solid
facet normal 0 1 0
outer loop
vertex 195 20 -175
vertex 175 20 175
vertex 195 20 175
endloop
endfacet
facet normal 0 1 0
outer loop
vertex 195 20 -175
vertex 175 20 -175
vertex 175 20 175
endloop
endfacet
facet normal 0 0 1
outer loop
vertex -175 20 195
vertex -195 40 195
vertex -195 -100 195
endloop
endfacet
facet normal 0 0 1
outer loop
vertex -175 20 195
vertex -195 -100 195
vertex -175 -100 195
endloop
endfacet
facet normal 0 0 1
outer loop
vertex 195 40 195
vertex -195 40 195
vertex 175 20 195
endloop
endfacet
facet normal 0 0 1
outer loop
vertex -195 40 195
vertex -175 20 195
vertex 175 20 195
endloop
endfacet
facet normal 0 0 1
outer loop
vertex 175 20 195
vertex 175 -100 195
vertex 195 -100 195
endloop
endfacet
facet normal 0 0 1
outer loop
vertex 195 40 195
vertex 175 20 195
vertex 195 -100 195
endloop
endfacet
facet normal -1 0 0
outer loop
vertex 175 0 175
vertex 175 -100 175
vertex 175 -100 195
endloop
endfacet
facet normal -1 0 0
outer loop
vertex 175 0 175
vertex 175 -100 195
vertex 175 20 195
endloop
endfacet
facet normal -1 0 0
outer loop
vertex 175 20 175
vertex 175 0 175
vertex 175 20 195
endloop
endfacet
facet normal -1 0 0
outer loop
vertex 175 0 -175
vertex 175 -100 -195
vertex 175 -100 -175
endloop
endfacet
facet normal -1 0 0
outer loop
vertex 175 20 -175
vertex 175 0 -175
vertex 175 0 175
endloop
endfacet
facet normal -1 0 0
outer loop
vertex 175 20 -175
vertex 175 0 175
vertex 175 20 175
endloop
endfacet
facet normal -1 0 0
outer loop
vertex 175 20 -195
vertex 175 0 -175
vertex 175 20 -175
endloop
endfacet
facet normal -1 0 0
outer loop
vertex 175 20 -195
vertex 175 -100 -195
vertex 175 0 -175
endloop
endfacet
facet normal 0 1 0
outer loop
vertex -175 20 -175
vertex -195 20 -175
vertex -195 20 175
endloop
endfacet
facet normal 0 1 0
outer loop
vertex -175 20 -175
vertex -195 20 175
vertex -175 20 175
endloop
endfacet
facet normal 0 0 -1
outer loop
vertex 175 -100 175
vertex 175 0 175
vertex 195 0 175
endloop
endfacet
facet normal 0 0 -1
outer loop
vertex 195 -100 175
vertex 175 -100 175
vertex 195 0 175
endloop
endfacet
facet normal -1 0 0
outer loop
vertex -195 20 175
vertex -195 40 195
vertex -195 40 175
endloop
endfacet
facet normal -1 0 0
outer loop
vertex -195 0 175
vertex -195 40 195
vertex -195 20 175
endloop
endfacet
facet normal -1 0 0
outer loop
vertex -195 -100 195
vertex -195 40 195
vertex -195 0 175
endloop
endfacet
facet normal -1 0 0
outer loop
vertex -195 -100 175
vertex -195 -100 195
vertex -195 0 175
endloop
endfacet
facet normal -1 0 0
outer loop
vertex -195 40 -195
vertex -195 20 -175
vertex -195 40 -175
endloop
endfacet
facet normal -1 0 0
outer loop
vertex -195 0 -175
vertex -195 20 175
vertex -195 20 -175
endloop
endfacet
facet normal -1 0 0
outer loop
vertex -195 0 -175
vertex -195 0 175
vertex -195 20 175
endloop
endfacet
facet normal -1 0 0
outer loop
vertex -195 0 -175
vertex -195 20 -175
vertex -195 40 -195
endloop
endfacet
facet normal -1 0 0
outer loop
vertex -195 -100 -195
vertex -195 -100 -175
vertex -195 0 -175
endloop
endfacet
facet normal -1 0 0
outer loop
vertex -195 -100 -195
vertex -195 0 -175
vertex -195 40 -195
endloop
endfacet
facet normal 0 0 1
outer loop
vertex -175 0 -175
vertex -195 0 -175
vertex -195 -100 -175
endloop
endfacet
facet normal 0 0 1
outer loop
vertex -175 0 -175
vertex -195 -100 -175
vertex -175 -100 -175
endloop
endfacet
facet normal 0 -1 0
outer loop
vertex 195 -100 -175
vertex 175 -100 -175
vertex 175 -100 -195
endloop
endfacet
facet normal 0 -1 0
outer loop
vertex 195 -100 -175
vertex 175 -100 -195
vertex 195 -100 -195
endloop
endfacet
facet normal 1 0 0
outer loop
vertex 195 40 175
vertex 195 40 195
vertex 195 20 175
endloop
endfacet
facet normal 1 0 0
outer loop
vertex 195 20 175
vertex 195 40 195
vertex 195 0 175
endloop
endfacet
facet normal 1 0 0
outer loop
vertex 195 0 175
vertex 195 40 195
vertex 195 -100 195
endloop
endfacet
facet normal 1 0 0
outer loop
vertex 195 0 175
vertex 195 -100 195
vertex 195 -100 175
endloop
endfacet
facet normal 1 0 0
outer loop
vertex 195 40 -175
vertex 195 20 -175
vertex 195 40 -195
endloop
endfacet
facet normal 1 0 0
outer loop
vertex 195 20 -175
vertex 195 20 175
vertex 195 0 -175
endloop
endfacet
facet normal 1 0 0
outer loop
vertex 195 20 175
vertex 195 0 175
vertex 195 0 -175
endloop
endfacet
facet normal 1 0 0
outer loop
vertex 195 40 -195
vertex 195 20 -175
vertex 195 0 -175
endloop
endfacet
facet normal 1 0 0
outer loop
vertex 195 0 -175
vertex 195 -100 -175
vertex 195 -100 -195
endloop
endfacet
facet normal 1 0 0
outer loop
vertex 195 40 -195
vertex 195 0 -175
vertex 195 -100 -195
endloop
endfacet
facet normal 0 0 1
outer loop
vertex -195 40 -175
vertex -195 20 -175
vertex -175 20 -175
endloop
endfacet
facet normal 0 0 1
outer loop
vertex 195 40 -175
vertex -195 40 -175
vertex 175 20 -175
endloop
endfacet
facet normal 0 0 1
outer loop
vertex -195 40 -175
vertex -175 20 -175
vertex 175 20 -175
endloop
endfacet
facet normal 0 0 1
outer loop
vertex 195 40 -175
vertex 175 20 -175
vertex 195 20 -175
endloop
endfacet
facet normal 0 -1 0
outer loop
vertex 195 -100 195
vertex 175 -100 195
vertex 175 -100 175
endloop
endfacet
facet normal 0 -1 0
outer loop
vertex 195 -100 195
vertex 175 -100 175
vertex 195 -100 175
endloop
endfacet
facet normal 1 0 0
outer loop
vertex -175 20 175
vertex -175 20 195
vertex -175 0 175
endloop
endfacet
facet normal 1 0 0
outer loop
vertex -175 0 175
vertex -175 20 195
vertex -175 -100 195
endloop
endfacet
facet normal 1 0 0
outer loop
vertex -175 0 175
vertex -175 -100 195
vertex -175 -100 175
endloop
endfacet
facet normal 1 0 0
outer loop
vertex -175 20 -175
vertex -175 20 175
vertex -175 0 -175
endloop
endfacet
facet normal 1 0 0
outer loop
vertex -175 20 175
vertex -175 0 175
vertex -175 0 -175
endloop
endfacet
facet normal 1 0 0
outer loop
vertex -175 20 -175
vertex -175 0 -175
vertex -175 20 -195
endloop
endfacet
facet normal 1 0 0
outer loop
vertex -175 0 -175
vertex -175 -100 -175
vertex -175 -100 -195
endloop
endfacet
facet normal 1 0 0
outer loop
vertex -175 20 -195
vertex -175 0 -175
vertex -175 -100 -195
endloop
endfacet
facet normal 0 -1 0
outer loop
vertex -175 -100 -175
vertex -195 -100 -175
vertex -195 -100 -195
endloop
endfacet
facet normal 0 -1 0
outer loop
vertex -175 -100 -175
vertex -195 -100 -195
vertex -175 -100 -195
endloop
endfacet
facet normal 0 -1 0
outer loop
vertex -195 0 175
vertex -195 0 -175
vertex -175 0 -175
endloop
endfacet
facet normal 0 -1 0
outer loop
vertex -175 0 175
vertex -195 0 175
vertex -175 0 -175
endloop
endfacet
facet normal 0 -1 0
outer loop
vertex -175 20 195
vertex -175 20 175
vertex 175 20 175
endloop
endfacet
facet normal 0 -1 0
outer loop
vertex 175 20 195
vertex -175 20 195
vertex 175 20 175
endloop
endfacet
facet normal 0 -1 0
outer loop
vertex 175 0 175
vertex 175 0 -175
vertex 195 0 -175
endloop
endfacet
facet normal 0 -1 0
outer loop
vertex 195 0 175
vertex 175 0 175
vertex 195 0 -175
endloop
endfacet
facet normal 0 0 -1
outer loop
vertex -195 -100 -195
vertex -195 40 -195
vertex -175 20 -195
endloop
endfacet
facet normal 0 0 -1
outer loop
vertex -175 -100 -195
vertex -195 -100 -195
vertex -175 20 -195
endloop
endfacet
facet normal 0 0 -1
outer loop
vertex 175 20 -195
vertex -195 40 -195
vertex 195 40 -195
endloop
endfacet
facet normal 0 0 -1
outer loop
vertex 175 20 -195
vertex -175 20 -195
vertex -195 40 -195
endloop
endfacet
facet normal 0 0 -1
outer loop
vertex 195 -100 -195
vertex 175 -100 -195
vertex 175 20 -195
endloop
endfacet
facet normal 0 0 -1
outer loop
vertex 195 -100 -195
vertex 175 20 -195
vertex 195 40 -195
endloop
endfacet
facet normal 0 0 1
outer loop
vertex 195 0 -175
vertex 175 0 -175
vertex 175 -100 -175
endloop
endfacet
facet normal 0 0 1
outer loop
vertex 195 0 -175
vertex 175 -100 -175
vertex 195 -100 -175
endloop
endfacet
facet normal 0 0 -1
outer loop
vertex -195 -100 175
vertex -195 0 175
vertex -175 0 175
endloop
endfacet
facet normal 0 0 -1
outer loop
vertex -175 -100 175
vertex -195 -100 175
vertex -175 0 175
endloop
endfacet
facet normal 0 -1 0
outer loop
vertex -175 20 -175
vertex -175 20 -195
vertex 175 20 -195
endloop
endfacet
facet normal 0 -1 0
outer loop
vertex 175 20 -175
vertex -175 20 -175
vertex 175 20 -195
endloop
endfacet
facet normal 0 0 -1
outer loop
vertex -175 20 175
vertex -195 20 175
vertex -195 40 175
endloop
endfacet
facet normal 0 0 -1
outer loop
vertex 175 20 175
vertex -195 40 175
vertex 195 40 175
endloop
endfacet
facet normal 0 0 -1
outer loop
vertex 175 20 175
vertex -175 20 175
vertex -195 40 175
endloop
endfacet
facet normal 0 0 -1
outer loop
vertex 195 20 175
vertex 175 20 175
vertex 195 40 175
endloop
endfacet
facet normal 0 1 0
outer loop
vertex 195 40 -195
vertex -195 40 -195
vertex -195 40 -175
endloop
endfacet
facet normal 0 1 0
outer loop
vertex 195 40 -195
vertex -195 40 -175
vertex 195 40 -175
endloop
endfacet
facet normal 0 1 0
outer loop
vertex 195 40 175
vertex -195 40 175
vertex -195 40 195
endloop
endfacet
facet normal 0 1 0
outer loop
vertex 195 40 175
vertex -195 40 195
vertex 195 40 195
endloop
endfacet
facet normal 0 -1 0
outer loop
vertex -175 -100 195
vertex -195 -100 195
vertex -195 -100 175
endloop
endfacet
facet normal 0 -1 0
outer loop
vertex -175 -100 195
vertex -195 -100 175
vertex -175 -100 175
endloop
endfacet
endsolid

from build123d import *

# Parameters (mm, degrees)
SKETCH1_W               = 390
SKETCH1_H               = 390
SKETCH1_W_2             = 350
SKETCH1_H_2             = 350
BOSS_EXTRUDE1_DEPTH     = 20
SKETCH2_W               = 20
SKETCH2_H               = 20
BOSS_EXTRUDE2_DEPTH     = 100
SKETCH4_W               = 390
SKETCH4_H               = 20
BOSS_EXTRUDE3_DEPTH     = 20
CUT_EXTRUDE1_DEPTH      = 448.353327919
CUT_EXTRUDE1_DEPTH_BACK = 448.353327919
SKETCH5_W               = 350
SKETCH5_H               = 20


with BuildPart() as part:
    # Sketch1 → Boss-Extrude1 (new body)
    with BuildSketch(Plane(origin=(0, 0, 0), x_dir=(1, 0, 0), z_dir=(0, 1, 0))):
        Rectangle(SKETCH1_W, SKETCH1_H)
        Rectangle(SKETCH1_W_2, SKETCH1_H_2, mode=Mode.SUBTRACT)
    extrude(amount=BOSS_EXTRUDE1_DEPTH)

    # Sketch2 → Boss-Extrude2 (add)
    with BuildSketch(Plane.XZ):
        with Locations((-185, 185)):
            Rectangle(SKETCH2_W, SKETCH2_H)
        with Locations((185, 185)):
            Rectangle(SKETCH2_W, SKETCH2_H)
        with Locations((185, -185)):
            Rectangle(SKETCH2_W, SKETCH2_H)
        with Locations((-185, -185)):
            Rectangle(SKETCH2_W, SKETCH2_H)
    extrude(amount=BOSS_EXTRUDE2_DEPTH)

    # Sketch4 → Boss-Extrude3 (add)
    with BuildSketch(Plane(origin=(0, 20, 0), x_dir=(1, 0, 0), z_dir=(0, 1, 0))):
        with Locations((0, -185)):
            Rectangle(SKETCH4_W, SKETCH4_H)
        with Locations((0, 185)):
            Rectangle(SKETCH4_W, SKETCH4_H)
    extrude(amount=BOSS_EXTRUDE3_DEPTH)

    # Sketch5 → Cut-Extrude1 (cut, two sides: drawn at the far end of the back side and taken through both)
    with BuildSketch(Plane.XY.offset(195).offset(-CUT_EXTRUDE1_DEPTH_BACK)):
        with Locations((0, 10)):
            Rectangle(SKETCH5_W, SKETCH5_H)
    extrude(amount=CUT_EXTRUDE1_DEPTH + CUT_EXTRUDE1_DEPTH_BACK, mode=Mode.SUBTRACT)


solid = part.part
